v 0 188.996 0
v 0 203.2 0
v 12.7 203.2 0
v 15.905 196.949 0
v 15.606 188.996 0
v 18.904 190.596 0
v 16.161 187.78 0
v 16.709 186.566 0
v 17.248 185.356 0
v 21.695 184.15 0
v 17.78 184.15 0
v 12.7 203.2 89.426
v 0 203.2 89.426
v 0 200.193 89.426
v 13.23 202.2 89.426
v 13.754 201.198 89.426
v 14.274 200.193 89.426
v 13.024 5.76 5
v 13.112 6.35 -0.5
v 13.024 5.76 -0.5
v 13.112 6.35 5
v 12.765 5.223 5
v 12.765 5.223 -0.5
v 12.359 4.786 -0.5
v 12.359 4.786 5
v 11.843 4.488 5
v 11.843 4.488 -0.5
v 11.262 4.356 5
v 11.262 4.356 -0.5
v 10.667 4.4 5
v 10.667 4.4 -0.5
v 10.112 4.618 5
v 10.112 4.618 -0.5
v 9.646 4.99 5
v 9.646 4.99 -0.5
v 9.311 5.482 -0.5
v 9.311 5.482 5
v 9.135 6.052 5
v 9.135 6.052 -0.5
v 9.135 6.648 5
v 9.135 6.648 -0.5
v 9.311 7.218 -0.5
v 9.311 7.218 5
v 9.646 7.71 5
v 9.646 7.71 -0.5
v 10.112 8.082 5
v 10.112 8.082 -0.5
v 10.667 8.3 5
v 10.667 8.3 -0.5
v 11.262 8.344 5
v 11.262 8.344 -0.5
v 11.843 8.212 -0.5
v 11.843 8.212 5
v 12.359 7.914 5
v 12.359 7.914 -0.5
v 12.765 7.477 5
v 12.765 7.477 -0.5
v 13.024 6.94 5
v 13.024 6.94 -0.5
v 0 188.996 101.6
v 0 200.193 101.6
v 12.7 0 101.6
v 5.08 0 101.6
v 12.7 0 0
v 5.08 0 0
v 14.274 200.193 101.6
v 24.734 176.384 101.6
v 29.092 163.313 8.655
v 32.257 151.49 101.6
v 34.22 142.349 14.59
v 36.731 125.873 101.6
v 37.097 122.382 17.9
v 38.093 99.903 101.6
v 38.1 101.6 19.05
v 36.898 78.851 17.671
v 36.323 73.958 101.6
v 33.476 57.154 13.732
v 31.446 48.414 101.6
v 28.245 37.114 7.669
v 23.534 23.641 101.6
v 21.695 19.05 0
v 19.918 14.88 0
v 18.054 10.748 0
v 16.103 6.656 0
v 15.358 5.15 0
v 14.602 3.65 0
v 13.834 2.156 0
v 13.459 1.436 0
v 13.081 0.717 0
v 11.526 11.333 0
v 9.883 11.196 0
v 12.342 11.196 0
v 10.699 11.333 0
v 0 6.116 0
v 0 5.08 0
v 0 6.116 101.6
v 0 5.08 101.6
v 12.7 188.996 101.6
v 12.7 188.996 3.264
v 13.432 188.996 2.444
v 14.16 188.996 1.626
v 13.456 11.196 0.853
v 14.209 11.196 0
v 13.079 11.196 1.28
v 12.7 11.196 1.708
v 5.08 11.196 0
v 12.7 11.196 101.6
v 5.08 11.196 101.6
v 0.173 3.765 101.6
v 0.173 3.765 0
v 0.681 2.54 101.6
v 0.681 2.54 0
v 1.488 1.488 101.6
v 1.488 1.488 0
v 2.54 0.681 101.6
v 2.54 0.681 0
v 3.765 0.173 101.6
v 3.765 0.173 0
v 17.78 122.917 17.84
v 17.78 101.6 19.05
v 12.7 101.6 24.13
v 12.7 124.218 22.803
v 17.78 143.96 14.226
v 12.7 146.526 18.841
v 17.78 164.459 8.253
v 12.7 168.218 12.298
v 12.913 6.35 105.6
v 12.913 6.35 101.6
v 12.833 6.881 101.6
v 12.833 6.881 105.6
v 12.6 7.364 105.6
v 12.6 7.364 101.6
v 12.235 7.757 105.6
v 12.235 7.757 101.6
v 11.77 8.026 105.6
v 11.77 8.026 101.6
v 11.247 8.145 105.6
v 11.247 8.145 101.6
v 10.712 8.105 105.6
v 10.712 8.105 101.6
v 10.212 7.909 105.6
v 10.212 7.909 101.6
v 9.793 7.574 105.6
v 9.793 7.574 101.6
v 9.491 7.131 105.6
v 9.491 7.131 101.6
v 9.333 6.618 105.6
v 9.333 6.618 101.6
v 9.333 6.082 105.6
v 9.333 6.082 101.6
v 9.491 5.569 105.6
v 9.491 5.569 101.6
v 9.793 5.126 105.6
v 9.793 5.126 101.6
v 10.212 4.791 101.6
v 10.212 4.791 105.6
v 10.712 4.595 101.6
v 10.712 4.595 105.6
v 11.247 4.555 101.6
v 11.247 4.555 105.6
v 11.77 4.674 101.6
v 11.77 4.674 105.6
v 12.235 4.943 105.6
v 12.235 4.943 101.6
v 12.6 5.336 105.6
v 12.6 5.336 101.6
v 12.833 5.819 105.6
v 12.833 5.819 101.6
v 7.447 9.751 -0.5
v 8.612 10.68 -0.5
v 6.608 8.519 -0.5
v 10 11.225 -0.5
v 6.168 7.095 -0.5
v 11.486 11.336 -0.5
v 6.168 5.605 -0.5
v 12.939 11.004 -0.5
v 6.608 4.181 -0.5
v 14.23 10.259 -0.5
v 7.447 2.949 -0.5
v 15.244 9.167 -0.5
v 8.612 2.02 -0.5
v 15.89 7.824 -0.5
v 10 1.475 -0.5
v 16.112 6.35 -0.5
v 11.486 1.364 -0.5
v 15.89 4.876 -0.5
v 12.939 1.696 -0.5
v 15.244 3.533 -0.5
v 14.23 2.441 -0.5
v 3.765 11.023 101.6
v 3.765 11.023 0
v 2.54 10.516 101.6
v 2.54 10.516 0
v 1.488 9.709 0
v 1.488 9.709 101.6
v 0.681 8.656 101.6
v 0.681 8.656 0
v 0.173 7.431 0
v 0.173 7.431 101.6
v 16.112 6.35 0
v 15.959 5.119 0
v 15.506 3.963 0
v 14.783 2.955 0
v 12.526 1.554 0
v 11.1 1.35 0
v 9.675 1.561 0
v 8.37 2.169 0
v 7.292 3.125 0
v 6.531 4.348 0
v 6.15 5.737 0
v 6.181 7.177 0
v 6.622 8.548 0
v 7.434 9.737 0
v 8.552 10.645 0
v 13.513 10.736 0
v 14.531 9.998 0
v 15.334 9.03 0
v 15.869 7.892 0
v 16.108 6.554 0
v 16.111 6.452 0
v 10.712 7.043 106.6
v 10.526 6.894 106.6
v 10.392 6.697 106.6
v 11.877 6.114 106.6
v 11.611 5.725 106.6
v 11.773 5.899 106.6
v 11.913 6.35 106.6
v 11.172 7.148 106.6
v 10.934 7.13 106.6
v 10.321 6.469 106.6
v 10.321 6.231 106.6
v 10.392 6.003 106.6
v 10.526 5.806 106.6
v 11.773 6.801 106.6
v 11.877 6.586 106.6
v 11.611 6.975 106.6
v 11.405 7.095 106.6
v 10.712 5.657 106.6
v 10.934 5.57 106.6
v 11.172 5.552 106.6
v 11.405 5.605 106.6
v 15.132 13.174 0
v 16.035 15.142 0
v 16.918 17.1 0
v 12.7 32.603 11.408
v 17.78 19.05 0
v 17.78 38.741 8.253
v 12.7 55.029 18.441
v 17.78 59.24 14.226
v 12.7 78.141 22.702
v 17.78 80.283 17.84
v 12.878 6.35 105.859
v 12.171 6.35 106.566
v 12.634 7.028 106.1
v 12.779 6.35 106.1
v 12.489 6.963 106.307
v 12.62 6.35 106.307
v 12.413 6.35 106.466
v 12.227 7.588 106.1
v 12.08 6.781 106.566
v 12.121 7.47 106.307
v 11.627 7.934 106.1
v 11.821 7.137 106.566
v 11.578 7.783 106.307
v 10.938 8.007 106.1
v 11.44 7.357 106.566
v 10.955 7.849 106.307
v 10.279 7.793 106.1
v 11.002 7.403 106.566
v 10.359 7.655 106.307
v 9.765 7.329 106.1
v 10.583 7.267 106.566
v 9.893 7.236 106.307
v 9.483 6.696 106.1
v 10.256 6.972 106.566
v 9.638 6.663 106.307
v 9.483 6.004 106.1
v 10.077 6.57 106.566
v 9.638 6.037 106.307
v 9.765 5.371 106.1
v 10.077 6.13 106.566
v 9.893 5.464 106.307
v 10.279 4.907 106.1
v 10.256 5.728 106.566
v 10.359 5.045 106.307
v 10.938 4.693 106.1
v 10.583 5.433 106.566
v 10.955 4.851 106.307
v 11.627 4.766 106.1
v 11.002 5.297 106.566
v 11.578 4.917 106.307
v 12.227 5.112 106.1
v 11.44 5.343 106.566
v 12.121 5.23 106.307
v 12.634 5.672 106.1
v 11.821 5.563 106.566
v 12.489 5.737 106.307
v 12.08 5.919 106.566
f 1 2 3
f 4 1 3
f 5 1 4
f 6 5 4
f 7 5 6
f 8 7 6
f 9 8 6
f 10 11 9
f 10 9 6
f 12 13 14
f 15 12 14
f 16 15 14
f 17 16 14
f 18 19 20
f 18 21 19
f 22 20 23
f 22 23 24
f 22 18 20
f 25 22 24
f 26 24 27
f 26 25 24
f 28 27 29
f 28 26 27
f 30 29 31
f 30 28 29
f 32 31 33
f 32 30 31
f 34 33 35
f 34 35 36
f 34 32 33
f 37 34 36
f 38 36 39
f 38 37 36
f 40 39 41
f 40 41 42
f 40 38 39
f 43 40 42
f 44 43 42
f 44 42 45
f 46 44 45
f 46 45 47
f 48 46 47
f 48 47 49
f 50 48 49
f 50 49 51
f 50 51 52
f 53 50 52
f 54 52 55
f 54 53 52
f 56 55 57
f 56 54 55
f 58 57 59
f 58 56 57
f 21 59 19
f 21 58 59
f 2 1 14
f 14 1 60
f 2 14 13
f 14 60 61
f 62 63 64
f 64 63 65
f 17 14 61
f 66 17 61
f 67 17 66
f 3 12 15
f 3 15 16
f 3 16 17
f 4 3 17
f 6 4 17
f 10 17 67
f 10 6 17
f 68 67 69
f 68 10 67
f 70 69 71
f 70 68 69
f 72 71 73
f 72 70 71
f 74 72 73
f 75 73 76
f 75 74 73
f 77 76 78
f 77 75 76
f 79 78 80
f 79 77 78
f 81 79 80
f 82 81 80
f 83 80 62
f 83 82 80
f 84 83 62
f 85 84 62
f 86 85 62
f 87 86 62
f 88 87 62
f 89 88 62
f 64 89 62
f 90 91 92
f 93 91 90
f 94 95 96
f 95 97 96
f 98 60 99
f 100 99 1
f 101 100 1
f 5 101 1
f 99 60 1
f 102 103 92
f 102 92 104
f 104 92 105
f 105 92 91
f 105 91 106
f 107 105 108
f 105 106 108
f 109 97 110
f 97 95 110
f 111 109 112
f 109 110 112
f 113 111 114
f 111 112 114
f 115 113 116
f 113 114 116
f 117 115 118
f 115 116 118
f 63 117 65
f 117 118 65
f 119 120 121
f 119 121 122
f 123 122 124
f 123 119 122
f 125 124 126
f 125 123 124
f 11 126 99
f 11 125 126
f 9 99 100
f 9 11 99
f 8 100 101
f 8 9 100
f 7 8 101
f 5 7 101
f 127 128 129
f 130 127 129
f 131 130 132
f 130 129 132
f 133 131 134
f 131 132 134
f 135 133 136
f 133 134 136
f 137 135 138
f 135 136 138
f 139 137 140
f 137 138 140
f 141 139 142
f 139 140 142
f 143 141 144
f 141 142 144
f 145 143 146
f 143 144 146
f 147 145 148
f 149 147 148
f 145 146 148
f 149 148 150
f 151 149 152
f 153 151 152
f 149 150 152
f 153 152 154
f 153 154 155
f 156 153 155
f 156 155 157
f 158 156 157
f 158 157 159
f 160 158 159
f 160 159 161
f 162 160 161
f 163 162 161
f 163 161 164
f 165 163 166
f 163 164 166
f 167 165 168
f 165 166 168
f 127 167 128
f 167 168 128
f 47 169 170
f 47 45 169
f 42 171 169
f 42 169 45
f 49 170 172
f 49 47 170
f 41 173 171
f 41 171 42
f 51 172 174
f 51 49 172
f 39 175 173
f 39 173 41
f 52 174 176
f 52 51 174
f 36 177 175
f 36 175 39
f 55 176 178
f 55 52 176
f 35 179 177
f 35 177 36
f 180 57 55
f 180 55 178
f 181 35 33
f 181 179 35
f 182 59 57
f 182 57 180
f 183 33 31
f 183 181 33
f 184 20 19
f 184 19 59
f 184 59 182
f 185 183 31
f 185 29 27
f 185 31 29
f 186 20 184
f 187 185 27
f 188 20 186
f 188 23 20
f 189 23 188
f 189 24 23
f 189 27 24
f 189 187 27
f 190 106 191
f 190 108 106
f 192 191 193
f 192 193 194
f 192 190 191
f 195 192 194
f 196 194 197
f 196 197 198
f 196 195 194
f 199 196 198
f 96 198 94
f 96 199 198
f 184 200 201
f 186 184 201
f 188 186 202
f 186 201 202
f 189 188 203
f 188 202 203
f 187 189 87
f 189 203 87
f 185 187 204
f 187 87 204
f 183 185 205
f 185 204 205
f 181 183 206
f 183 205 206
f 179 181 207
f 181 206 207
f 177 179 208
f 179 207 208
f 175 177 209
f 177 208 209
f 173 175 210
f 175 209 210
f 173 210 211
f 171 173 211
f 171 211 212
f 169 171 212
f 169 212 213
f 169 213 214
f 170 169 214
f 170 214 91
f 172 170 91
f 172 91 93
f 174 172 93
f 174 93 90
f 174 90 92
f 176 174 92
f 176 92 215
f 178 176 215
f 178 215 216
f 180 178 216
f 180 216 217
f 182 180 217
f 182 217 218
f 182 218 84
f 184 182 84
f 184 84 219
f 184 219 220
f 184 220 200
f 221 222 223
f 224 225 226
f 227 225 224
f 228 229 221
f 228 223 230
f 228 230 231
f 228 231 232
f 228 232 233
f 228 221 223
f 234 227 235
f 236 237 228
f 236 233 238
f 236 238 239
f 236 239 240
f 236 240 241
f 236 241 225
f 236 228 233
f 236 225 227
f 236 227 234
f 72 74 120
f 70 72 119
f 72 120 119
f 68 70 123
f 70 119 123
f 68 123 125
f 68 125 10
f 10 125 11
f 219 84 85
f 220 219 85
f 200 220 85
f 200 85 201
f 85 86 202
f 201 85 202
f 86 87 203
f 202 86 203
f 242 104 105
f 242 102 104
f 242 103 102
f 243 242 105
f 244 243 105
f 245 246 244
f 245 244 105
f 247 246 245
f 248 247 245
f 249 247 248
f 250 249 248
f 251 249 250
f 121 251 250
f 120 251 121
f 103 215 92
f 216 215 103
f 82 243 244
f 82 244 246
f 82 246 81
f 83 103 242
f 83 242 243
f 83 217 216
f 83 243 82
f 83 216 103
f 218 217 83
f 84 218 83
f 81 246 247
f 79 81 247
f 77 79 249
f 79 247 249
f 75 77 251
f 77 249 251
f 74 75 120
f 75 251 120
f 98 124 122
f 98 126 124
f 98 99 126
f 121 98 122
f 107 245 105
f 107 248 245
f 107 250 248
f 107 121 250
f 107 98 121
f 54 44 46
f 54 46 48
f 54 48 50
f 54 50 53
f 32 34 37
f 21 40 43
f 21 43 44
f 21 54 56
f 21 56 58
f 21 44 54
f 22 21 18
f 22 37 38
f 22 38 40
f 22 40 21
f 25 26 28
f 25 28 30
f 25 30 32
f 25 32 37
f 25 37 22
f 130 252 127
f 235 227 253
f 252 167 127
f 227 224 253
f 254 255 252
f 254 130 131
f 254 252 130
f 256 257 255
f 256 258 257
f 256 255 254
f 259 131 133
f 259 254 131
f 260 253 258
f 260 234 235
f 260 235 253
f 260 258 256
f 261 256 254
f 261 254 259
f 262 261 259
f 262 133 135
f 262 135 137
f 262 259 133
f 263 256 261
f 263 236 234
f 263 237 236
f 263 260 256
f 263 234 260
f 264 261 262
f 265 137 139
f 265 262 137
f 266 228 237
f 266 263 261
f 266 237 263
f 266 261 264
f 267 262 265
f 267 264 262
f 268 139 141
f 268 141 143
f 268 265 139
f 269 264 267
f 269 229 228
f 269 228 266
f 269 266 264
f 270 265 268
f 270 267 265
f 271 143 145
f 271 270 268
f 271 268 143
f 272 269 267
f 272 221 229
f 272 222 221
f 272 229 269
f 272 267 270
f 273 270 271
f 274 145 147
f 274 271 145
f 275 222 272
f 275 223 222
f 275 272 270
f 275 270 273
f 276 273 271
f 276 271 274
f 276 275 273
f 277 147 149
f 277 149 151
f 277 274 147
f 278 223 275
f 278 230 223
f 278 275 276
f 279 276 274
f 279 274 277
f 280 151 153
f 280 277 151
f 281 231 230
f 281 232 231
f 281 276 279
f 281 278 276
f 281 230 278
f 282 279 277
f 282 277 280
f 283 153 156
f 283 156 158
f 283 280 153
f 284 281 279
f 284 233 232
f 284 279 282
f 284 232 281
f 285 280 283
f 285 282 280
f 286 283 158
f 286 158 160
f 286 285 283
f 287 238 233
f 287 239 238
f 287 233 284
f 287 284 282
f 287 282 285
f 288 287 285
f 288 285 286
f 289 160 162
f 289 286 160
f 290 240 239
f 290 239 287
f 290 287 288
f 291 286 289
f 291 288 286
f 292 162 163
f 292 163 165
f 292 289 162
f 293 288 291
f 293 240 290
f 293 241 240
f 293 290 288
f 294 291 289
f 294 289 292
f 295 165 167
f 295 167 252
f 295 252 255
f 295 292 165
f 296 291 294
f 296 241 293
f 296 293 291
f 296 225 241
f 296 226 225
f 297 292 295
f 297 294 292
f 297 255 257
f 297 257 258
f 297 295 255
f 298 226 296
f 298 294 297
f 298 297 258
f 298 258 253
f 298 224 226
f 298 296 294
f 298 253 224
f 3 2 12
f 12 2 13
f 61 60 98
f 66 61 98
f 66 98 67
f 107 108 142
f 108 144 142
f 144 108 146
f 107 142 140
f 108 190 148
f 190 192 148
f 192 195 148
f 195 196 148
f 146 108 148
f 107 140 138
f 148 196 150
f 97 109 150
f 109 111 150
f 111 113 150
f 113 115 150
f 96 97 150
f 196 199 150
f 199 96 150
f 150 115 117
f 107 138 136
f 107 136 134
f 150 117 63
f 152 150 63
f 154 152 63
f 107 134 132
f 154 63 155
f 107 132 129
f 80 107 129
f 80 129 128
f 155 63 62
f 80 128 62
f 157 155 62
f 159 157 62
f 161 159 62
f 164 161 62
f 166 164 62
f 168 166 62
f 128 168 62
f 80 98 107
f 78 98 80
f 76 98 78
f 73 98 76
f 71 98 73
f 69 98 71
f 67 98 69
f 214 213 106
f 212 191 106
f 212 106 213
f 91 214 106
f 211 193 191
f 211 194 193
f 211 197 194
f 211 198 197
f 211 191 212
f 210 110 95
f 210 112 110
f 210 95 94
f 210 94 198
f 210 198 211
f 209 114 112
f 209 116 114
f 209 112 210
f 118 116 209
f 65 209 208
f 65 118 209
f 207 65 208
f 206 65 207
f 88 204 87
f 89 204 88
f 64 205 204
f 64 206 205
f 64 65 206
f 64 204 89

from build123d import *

# Parameters (mm, degrees)
F1_DEPTH  = 12.7
F3_DEPTH  = 101.6
F5_DEPTH  = 38.101
F6_W      = 42.559474
F6_H      = 49.497269
F7_DEPTH  = 38.101
F8_R      = 2
F9_DEPTH  = 5
F10_R     = 5
F10_R_2   = 2
F11_DEPTH = 0.5
F12_R     = 1.8
F13_DEPTH = 5
F14_R     = 1
F16_DEPTH = 12.7
F17_R     = 5.08
F18_SIZE  = 5.08


with BuildPart() as f1:
    # F0 (on Right) → F1 (new body)
    with BuildSketch(Plane.YZ):
        Polygon((0, 101.6), (0, 0), (52.753847, 0), (101.6, 0), (150.446153, 0), (203.2, 0), (203.2, 101.6), (101.6, 101.6), align=None)
    extrude(amount=F1_DEPTH)

    # F2 (on face) → F3 (join, through all)
    with BuildSketch(Plane(origin=(0, 0, 0), x_dir=(1, 0, 0), z_dir=(0, 0, -1))):
        with BuildLine():
            Line((12.7, 0), (12.7, -203.2))
            ThreePointArc((12.7, -203.2), (38.1, -101.6), (12.7, 0))
        make_face()
    extrude(amount=-F3_DEPTH)

    # F4 (on face) → F5 (cut, through all)
    with BuildSketch(Plane(origin=(0, 0, 0), x_dir=(0, -1, 0), z_dir=(-1, 0, 0))):
        with BuildLine():
            Line((-101.6, 0), (-19.05, 0))
            ThreePointArc((-19.05, 0), (-59.240217, 14.225728), (-101.6, 19.05))
            Line((-101.6, 19.05), (-101.6, 0))
        make_face()
        with BuildLine():
            Line((-101.6, 0), (-101.6, 19.05))
            ThreePointArc((-101.6, 19.05), (-143.959783, 14.225728), (-184.15, 0))
            Line((-184.15, 0), (-101.6, 0))
        make_face()
    extrude(amount=-F5_DEPTH, mode=Mode.SUBTRACT)

    # F6 (on face) → F7 (cut, through all)
    with BuildSketch(Plane(origin=(0, 0, 0), x_dir=(0, -1, 0), z_dir=(-1, 0, 0))):
        with Locations((-221.472621, 114.174965)):
            Rectangle(F6_W, F6_H)
    extrude(amount=-F7_DEPTH, mode=Mode.SUBTRACT)

    # F8 (on face) → F9 (cut)
    with BuildSketch(Plane(origin=(0, 0, 0), x_dir=(1, 0, 0), z_dir=(0, 0, -1))):
        with Locations((11.1125, -6.35)):
            Circle(F8_R)
    extrude(amount=-F9_DEPTH, mode=Mode.SUBTRACT)

    # F10 (on face) → F11 (join)
    with BuildSketch(Plane(origin=(0, 0, 0), x_dir=(1, 0, 0), z_dir=(0, 0, -1))):
        with Locations((11.1125, -6.35)):
            Circle(F10_R)
        with Locations((11.1125, -6.35)):
            Circle(F10_R_2, mode=Mode.SUBTRACT)
    extrude(amount=F11_DEPTH)

    # F12 (on face) → F13 (join)
    with BuildSketch(Plane.XY.offset(101.6)):
        with Locations((11.1125, 6.35)):
            Circle(F12_R)
    extrude(amount=F13_DEPTH)

    # F14
    f14_edges = [f1.edges().sort_by_distance(p)[0] for p in [
        (9.3125, 6.35, 106.6),
    ]]
    fillet(f14_edges, radius=F14_R)

    # F15 (on face) → F16 (cut)
    with BuildSketch(Plane(origin=(0, 0, 0), x_dir=(0, -1, 0), z_dir=(-1, 0, 0))):
        Polygon((-100.096442, 101.6), (-188.996442, 101.6), (-188.996442, 0), (-100.096442, 0), (-11.196442, 0), (-11.196442, 101.6), align=None)
    extrude(amount=-F16_DEPTH, mode=Mode.SUBTRACT)

    # F17
    f17_edges = [f1.edges().sort_by_distance(p)[0] for p in [
        (0, 0, 50.8),
        (0, 11.196442, 50.8),
    ]]
    fillet(f17_edges, radius=F17_R)

    # F18
    f18_edges = [f1.edges().sort_by_distance(p)[0] for p in [
        (12.7, 101.6, 19.05),
    ]]
    chamfer(f18_edges, length=F18_SIZE)


solid = f1.part
